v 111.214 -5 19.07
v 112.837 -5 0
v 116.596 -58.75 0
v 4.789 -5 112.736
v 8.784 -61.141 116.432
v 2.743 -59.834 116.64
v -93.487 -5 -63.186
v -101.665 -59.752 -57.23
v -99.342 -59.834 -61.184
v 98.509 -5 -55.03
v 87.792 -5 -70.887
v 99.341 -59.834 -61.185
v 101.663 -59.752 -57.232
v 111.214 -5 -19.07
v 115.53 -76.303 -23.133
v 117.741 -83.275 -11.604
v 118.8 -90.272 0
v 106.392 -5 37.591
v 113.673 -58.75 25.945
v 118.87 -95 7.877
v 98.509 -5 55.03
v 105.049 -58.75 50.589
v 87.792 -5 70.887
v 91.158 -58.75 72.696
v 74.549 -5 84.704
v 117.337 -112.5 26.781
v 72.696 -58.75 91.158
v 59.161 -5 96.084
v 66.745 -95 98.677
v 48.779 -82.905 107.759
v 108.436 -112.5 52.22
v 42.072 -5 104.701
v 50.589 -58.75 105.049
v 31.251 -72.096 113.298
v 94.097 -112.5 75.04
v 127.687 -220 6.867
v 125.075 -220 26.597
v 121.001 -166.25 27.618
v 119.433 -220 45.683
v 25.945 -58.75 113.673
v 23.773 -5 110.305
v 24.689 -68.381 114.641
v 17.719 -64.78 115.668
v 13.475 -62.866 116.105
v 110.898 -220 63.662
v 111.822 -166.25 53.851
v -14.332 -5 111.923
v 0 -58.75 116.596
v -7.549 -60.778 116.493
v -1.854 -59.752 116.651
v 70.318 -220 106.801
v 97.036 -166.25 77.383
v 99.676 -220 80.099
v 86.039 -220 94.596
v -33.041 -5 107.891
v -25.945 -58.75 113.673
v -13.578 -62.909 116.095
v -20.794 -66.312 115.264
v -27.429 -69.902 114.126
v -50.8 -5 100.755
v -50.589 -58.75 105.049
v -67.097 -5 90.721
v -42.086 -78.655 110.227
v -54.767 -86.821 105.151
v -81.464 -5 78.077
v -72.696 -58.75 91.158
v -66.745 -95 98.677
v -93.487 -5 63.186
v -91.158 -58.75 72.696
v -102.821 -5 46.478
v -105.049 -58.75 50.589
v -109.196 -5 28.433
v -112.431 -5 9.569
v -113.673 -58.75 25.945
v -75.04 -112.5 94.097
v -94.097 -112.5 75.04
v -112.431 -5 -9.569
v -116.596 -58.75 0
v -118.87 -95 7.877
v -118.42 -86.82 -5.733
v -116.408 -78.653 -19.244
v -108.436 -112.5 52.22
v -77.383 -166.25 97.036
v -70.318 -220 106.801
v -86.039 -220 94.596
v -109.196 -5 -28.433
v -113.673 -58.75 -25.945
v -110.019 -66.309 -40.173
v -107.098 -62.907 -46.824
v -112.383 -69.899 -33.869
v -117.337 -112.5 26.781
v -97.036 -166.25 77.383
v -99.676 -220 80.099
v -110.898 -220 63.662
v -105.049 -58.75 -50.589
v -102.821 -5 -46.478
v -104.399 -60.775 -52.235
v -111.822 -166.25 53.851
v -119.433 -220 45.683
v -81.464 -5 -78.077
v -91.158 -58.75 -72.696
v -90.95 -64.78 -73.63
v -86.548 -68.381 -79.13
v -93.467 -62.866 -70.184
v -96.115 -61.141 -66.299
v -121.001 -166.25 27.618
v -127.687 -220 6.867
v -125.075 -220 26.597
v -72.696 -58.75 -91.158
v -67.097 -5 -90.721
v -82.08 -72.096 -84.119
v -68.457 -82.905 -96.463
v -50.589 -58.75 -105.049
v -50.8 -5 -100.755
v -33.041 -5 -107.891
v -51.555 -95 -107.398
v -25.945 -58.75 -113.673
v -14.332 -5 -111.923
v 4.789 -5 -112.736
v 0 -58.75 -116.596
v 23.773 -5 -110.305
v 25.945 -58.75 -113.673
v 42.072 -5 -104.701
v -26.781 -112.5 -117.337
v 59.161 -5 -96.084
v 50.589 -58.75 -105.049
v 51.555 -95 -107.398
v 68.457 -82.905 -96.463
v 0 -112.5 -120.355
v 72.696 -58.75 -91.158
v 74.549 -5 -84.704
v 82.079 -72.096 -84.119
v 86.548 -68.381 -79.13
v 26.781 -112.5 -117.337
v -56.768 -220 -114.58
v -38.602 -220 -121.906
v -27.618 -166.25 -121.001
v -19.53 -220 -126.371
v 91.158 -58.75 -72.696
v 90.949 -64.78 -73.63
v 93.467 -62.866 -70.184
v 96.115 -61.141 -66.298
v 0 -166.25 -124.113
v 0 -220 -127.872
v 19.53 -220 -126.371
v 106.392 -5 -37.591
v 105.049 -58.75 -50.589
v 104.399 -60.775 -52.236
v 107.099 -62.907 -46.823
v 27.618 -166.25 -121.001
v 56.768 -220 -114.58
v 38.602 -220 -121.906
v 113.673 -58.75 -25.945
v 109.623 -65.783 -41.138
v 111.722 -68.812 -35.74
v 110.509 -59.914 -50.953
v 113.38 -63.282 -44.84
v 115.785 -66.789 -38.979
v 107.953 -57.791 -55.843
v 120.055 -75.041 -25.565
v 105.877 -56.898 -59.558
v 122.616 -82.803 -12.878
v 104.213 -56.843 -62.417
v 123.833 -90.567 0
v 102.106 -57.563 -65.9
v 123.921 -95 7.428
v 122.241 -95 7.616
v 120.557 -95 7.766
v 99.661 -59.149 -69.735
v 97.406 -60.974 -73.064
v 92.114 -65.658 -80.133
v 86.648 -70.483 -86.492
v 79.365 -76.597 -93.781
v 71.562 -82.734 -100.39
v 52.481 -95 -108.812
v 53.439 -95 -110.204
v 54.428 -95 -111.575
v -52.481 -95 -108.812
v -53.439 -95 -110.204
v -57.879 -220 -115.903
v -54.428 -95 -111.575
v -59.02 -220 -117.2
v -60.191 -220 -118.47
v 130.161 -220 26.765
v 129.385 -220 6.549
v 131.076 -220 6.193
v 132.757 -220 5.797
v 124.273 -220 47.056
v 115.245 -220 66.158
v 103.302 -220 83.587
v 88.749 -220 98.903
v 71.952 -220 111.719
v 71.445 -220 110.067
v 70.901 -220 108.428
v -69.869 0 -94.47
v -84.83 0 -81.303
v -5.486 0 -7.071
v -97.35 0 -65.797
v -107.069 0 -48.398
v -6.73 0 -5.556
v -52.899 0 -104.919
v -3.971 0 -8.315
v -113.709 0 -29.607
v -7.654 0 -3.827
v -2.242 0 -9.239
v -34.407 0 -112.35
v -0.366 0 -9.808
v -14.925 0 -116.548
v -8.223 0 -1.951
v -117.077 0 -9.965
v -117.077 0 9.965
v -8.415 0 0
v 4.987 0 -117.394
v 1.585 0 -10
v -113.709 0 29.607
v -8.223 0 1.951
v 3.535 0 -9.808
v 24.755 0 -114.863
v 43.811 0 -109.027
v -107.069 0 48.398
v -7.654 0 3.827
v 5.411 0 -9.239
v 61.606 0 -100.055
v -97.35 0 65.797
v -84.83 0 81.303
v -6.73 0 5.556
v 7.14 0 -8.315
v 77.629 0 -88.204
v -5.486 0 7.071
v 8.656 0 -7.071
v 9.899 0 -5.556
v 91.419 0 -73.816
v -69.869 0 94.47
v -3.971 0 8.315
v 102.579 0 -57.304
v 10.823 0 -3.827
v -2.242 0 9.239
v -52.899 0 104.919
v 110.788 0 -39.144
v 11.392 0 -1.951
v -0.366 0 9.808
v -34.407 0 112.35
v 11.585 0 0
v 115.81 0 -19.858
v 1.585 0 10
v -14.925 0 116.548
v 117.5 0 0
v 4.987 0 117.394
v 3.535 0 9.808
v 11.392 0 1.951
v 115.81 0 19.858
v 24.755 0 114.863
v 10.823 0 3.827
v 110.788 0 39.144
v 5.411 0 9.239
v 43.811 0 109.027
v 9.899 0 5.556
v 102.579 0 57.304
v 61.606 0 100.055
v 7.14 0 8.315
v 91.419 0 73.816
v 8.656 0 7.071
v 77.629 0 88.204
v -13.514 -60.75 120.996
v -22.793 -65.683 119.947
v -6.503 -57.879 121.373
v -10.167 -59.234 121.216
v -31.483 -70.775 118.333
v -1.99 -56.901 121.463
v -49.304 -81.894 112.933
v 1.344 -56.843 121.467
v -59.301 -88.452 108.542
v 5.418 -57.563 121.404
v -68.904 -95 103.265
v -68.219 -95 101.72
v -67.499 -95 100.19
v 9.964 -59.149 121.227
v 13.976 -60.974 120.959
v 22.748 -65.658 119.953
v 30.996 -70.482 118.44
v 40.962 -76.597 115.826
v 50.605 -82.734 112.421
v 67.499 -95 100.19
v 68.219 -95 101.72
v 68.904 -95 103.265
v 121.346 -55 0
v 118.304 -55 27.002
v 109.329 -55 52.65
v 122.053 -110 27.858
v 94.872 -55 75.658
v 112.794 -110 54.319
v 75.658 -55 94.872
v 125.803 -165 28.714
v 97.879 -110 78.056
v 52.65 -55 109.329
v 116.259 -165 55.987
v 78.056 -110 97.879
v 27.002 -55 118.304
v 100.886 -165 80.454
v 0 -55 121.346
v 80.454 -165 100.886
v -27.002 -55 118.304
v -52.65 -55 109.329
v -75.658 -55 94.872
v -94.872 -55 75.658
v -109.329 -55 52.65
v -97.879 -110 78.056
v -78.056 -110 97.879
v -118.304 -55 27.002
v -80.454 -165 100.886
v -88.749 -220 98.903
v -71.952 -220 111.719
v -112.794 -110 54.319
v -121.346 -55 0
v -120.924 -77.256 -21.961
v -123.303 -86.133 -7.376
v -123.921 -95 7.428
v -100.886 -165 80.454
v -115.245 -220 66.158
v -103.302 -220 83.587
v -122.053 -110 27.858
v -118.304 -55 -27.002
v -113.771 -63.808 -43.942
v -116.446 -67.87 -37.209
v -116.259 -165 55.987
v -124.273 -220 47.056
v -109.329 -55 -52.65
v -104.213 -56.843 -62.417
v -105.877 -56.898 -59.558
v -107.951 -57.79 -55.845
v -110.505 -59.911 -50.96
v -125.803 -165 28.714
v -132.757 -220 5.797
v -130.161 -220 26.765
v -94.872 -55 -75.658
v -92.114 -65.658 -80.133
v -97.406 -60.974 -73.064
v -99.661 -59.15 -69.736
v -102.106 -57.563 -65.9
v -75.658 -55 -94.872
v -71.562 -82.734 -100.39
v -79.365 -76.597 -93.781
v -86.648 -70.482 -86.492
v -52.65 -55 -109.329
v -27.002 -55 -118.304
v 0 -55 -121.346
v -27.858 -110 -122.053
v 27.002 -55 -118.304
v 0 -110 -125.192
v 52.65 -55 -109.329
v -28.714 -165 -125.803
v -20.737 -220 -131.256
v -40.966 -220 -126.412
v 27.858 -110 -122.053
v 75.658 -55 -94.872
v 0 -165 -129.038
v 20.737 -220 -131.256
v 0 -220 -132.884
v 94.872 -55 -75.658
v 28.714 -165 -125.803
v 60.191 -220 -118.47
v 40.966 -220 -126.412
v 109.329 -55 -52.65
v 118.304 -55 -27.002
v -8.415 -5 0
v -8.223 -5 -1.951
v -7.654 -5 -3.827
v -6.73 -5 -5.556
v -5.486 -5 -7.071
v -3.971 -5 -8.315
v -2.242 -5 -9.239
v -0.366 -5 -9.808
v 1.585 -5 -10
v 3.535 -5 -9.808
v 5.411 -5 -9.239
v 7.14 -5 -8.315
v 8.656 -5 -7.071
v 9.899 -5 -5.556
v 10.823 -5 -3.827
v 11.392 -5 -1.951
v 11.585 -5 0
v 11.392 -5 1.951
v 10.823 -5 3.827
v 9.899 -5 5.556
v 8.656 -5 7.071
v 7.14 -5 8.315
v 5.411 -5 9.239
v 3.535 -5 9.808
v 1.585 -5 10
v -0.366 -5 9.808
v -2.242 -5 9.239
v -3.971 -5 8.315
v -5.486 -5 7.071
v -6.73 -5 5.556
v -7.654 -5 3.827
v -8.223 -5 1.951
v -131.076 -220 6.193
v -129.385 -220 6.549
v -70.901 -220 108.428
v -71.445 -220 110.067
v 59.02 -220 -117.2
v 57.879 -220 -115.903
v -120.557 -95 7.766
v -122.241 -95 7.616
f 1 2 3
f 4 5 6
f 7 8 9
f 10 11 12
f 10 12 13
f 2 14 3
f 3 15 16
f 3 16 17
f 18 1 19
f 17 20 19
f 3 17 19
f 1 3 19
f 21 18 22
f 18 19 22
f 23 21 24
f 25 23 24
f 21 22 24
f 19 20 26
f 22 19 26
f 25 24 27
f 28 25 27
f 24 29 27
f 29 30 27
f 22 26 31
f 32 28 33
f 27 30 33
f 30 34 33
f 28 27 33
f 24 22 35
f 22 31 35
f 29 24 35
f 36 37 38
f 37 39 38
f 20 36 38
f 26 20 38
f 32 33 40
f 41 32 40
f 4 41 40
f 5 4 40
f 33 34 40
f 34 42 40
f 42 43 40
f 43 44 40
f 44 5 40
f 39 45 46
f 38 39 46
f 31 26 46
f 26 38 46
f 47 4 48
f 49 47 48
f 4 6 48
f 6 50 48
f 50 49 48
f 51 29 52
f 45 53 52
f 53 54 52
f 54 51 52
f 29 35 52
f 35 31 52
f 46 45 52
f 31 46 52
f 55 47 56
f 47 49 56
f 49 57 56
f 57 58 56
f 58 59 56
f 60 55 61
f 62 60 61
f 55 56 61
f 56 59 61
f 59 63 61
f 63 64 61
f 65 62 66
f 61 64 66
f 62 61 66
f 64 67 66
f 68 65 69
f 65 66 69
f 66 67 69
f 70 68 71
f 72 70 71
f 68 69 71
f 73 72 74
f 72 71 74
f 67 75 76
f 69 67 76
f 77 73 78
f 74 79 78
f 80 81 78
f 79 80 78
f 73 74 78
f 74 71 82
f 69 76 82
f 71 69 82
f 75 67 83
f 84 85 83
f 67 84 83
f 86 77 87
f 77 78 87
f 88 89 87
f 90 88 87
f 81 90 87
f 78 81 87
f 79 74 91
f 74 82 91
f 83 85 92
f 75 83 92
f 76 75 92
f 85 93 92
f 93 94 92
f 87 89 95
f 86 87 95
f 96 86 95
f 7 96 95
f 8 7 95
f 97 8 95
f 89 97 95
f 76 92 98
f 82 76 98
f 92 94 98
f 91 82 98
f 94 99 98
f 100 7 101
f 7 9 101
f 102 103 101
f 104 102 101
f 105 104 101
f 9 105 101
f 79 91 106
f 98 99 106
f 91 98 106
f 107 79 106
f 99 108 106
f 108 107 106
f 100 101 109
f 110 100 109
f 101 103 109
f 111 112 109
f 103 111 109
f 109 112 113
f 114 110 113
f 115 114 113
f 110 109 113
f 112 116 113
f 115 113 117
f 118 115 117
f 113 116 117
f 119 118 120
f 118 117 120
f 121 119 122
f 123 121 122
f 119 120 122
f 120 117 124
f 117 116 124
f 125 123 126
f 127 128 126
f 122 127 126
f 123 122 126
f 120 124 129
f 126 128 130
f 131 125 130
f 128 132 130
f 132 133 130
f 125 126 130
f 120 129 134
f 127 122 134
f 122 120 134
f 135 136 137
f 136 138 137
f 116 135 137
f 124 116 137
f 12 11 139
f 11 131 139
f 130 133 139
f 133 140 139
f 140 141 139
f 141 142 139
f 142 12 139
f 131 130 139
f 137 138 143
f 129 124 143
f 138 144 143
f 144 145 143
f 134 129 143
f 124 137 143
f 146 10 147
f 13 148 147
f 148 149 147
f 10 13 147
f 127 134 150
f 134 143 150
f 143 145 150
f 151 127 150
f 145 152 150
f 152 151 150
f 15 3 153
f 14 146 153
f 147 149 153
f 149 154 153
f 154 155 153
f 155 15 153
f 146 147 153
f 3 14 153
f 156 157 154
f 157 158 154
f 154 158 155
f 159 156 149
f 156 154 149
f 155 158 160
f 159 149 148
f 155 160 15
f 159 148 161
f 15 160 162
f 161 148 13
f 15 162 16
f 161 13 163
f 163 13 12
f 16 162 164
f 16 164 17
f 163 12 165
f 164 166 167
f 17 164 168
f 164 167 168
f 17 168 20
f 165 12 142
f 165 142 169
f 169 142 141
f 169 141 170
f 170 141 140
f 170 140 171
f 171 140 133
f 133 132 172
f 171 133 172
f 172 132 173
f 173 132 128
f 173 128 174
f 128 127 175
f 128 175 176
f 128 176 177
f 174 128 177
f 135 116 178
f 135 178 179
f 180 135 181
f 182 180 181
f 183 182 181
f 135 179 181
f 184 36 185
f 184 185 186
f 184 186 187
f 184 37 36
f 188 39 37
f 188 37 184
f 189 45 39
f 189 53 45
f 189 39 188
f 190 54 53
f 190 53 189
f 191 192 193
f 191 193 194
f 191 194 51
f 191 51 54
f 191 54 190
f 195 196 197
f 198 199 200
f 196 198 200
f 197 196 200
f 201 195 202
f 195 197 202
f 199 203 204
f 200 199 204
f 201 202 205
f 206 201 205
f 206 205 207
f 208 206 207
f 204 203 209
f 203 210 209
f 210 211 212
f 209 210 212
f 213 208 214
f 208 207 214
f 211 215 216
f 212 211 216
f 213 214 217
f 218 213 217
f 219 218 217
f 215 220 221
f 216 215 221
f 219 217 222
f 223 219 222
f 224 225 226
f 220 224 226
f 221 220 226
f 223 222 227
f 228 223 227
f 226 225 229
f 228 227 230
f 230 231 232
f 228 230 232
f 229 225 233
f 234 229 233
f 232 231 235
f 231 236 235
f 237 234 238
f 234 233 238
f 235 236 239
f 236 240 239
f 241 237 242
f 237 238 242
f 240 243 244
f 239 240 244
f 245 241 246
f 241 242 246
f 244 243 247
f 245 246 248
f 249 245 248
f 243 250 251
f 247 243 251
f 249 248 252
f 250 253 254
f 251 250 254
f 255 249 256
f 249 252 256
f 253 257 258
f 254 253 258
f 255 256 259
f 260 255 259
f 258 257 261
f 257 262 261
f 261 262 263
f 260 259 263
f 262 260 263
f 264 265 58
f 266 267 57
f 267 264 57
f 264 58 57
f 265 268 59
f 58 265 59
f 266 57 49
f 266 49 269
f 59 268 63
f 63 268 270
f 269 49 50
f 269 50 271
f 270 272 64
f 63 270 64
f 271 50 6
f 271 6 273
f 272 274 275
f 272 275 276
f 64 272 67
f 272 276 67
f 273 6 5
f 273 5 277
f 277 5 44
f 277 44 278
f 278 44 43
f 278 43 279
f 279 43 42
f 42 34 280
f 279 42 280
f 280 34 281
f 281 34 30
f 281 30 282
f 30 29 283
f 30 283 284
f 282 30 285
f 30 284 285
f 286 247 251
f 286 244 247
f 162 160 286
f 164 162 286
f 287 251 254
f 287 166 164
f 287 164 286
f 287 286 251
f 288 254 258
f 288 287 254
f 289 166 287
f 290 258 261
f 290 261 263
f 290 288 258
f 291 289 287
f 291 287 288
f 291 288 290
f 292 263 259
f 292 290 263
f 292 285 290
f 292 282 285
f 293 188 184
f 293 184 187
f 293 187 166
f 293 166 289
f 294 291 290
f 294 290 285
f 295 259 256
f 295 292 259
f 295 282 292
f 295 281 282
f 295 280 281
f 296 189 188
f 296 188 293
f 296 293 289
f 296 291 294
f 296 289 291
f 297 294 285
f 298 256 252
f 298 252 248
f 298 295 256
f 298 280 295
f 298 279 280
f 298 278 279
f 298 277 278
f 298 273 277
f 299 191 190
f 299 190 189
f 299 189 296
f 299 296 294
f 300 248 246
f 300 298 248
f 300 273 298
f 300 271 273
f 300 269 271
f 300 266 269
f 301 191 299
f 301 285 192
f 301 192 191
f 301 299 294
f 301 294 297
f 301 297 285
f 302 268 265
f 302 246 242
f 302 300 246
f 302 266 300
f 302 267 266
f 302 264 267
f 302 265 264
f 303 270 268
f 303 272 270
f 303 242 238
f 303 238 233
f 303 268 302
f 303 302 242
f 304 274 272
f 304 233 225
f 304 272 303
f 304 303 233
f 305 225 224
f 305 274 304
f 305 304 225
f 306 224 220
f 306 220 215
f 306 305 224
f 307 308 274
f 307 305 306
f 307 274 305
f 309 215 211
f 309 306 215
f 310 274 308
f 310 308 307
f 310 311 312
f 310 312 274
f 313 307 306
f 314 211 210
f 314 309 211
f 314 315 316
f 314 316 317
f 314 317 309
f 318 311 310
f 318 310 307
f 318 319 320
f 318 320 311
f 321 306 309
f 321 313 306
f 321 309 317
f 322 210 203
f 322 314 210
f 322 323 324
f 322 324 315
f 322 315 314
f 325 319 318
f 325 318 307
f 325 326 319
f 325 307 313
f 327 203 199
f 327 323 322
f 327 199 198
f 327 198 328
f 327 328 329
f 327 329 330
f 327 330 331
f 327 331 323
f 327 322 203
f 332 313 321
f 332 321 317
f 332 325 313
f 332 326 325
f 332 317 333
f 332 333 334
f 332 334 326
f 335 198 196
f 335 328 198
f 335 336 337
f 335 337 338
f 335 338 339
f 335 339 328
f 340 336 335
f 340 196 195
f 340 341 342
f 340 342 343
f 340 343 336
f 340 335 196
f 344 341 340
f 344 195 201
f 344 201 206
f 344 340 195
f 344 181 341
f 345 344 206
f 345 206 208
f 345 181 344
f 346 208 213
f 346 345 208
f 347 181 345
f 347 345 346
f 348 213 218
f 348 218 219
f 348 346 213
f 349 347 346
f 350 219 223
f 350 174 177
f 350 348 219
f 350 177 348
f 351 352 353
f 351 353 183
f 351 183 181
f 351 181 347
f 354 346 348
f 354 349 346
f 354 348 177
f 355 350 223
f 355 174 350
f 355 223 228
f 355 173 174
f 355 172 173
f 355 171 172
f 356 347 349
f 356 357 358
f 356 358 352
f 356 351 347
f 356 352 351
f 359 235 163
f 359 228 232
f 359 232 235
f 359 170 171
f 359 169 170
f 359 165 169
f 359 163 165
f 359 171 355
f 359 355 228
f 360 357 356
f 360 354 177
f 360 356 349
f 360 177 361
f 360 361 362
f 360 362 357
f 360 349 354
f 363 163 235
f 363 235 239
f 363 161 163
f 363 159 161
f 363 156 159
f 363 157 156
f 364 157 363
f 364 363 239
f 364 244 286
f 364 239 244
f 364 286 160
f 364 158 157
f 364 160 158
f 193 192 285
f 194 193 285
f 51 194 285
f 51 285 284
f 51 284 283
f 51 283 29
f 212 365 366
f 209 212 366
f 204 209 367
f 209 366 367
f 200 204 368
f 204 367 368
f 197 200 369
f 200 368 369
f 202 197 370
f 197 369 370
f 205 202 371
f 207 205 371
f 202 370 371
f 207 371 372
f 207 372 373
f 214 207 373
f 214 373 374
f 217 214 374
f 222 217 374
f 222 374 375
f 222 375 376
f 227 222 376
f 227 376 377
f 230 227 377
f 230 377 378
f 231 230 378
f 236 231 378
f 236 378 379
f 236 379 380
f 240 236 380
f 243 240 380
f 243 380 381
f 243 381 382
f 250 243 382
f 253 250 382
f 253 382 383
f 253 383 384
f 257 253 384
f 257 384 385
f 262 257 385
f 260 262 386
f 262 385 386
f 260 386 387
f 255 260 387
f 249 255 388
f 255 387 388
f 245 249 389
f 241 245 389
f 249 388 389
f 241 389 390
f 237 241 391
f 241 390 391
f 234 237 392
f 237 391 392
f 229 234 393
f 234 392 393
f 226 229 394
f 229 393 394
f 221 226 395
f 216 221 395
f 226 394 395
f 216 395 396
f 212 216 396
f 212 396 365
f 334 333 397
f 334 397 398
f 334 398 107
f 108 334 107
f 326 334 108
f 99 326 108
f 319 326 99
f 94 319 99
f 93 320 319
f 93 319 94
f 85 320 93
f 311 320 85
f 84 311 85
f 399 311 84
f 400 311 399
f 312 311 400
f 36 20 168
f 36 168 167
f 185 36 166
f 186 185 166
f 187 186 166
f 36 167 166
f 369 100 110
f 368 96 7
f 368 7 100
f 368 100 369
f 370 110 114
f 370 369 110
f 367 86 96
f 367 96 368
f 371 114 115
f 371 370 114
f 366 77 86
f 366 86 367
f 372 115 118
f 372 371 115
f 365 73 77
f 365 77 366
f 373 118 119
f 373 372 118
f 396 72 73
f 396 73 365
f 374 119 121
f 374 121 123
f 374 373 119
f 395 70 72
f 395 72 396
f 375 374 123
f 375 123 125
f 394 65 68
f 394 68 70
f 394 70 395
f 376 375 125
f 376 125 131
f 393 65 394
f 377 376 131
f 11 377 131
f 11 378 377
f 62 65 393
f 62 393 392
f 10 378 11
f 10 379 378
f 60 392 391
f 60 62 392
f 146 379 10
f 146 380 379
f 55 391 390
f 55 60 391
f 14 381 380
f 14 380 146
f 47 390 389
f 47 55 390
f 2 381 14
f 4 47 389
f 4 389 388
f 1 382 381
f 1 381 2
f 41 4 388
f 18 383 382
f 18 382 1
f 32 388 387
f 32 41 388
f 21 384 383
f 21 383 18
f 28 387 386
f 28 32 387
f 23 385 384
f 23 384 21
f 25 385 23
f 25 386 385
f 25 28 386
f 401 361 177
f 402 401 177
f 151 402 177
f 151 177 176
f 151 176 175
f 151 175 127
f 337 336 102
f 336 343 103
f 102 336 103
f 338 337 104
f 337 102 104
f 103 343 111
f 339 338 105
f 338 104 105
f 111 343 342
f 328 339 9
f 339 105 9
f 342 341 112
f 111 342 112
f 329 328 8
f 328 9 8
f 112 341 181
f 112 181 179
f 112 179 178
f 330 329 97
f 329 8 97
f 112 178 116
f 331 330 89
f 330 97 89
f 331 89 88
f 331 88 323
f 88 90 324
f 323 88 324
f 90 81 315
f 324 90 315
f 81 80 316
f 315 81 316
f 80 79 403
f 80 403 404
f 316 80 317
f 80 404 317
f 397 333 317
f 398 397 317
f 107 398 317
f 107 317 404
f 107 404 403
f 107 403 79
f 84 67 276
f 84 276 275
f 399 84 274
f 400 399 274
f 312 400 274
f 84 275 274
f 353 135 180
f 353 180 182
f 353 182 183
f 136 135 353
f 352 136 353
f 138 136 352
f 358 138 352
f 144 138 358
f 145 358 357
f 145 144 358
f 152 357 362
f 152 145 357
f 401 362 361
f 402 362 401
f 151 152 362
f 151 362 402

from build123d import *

# Parameters (mm, degrees)
F0_R     = 117.5
F1_DEPTH = 220
F1_TAPER = -4
F2_T     = -5
F3_D     = 20
F3_DEPTH = 200
F3_TIP   = 6.0086061903
F5_D     = 150
F5_DEPTH = 125
F5_TIP   = 45.0645464271


with BuildPart() as f1:
    # F0 (on Front) → F1 (new body)
    with BuildSketch(Plane.XZ):
        Circle(F0_R)
    extrude(amount=F1_DEPTH, taper=F1_TAPER)

    # F2
    f2_openings = [f1.faces().sort_by_distance(p)[0] for p in [
        (0, -220, 0),
    ]]
    offset(amount=F2_T, openings=f2_openings, kind=Kind.INTERSECTION)

    # F3
    with Locations(Plane(origin=(0, 0, 0), x_dir=(1, 0, 0), z_dir=(0, 1, 0))):
        with Locations((1.5845698072, 0)):
            Hole(F3_D / 2, depth=F3_DEPTH)
            with Locations((0, 0, -(F3_DEPTH + F3_TIP / 2))):  # 118° drill point
                Cone(0, F3_D / 2, F3_TIP, mode=Mode.SUBTRACT)

    # F5
    with Locations(Plane.XZ.offset(220)):
        with Locations((0, 132.8838986276), (-114.7513767367, -67.0093430165), (114.7513767367, -67.0093430165)):
            Hole(F5_D / 2, depth=F5_DEPTH)
            with Locations((0, 0, -(F5_DEPTH + F5_TIP / 2))):  # 118° drill point
                Cone(0, F5_D / 2, F5_TIP, mode=Mode.SUBTRACT)


solid = f1.part
